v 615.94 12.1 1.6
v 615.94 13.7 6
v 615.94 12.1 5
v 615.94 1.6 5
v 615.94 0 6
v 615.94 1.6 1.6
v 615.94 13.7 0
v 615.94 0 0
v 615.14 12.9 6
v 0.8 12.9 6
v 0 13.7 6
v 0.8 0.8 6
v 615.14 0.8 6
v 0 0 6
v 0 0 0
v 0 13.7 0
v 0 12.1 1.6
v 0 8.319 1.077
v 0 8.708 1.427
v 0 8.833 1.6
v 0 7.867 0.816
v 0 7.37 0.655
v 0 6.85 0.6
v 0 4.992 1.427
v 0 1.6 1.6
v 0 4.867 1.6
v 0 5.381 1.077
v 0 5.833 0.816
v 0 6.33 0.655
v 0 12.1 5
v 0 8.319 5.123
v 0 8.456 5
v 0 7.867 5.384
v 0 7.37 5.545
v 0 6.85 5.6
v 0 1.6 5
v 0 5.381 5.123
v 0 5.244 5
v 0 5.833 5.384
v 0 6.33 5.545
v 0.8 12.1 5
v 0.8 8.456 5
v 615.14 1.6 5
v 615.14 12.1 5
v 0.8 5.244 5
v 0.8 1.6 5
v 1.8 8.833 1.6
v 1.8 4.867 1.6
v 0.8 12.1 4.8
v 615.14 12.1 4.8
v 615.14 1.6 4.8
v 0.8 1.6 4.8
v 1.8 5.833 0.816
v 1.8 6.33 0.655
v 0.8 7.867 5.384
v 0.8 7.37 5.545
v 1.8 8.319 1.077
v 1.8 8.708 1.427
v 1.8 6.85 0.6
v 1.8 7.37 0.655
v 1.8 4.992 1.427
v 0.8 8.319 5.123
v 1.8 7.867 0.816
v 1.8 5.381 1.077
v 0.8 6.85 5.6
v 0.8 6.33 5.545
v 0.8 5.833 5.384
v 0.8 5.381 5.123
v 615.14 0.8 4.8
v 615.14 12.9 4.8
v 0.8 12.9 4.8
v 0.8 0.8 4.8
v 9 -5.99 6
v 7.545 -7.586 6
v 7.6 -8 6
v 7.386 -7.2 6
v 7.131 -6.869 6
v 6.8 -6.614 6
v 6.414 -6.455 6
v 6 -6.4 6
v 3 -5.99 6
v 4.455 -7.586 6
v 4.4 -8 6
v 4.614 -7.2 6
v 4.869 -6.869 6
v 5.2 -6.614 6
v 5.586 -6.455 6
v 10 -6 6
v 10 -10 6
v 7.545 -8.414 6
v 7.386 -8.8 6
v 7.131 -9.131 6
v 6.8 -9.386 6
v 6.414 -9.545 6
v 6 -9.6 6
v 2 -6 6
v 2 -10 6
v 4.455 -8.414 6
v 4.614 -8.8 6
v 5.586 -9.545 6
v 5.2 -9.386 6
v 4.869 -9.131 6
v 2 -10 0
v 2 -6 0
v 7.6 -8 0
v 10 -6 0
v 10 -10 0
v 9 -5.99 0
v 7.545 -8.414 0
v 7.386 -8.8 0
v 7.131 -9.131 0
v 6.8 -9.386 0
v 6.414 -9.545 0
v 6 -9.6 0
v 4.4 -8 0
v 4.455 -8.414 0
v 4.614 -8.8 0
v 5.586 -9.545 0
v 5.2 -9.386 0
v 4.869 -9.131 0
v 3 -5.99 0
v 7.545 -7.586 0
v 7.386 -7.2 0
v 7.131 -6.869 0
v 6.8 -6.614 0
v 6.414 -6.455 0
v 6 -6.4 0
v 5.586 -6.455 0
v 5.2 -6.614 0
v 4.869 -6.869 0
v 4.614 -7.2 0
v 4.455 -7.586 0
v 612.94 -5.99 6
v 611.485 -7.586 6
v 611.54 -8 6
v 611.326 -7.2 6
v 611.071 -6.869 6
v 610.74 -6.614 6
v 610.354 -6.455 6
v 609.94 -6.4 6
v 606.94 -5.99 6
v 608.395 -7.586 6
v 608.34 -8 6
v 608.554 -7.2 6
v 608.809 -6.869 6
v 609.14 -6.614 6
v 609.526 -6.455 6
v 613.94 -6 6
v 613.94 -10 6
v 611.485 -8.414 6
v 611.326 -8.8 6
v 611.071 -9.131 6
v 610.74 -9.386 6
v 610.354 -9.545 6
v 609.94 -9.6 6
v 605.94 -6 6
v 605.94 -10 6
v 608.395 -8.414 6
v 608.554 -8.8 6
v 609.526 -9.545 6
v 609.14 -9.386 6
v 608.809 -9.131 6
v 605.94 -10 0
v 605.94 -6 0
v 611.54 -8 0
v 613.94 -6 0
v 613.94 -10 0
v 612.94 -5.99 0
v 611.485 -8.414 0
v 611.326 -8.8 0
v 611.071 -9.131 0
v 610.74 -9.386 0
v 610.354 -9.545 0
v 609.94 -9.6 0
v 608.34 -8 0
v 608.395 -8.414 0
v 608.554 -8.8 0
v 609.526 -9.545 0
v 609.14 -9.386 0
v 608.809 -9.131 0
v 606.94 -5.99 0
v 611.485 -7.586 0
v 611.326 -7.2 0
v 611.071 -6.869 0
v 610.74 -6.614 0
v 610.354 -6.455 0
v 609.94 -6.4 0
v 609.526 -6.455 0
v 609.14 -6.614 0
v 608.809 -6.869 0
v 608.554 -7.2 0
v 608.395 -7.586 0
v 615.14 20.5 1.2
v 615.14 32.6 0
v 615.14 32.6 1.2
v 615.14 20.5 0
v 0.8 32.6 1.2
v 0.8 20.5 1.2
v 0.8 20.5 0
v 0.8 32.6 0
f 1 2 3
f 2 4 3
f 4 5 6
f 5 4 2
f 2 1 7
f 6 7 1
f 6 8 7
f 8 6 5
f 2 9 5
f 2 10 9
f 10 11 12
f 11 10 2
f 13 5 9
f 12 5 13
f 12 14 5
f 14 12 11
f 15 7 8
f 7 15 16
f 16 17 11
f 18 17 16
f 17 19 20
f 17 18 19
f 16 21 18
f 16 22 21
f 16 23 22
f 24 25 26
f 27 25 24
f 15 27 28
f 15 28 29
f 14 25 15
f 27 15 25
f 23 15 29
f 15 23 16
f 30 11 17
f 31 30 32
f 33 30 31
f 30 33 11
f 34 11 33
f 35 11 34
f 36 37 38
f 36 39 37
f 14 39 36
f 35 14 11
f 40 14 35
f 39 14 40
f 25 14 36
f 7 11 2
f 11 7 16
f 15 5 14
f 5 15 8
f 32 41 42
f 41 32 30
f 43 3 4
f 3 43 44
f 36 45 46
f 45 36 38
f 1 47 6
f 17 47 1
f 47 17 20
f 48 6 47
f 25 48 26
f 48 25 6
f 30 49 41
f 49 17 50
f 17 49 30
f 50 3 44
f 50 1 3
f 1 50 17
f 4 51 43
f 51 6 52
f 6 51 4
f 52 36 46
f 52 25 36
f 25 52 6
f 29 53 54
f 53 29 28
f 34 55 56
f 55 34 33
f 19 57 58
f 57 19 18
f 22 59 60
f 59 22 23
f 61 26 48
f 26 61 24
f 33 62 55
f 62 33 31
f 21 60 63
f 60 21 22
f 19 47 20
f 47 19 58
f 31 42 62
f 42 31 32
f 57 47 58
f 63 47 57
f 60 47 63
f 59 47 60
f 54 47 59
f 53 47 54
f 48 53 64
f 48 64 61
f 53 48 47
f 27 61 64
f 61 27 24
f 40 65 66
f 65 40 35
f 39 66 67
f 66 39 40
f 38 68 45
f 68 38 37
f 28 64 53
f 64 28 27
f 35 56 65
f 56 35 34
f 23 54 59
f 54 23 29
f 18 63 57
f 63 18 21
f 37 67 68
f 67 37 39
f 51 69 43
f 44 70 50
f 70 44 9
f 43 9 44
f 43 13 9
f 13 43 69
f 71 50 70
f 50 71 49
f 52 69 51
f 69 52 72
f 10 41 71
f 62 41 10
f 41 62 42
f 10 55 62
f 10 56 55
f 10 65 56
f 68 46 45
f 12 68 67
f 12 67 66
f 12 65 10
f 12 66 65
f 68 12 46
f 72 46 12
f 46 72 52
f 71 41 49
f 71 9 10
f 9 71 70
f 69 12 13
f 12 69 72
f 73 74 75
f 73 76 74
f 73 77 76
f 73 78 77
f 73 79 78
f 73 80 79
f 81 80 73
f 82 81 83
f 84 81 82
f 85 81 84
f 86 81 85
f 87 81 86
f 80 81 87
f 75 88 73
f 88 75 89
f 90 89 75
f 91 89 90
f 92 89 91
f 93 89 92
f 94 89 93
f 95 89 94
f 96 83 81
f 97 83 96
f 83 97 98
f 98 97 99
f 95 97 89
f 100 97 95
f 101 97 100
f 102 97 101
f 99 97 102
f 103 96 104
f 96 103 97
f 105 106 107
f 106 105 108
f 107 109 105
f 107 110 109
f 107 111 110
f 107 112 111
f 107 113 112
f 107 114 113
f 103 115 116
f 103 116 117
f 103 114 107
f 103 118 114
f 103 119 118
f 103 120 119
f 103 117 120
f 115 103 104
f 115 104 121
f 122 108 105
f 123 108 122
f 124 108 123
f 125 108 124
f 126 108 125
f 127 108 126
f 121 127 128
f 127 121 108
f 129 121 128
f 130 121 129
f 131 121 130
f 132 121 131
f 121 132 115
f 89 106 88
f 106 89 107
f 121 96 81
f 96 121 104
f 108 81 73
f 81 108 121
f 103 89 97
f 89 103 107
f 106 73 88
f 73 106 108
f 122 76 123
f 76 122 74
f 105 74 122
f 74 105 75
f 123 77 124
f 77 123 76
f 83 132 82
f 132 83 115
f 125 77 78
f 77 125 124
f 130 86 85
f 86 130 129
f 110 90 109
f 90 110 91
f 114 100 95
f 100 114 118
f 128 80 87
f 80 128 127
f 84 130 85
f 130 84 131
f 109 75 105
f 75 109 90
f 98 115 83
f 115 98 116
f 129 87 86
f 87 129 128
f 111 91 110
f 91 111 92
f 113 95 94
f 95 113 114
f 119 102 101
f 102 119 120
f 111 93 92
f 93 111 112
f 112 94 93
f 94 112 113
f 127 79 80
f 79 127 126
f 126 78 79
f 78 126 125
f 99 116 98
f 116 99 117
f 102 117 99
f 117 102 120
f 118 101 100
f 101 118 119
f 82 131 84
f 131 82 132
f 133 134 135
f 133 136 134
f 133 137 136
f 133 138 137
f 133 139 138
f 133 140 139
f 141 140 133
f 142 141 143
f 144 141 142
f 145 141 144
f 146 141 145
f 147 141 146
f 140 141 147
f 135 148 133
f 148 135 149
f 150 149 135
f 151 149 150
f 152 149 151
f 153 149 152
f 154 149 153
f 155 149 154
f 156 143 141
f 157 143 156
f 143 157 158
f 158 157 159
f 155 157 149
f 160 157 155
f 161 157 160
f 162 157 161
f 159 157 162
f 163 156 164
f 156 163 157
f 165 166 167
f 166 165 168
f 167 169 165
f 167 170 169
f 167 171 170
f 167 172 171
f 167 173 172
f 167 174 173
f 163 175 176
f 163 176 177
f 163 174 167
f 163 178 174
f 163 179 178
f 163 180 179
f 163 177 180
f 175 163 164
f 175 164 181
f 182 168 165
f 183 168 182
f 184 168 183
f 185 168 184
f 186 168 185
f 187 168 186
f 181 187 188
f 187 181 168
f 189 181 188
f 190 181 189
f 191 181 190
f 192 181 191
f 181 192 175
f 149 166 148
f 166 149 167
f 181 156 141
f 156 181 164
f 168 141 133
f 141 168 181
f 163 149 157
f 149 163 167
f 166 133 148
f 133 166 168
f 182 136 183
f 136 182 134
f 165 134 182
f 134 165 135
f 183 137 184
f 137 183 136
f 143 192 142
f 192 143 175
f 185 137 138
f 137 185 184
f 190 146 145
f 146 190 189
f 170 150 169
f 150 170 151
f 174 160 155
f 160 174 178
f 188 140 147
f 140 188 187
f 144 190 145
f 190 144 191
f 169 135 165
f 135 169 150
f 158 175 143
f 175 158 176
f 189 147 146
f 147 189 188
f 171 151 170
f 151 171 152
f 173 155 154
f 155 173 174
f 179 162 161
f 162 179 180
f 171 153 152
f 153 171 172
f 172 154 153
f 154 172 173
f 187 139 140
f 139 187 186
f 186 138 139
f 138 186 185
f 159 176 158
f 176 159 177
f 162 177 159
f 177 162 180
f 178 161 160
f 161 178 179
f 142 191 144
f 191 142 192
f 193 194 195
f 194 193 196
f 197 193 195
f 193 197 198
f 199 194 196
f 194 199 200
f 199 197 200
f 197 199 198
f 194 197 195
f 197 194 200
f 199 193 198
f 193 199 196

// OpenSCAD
// ============================================================
//  Lumina LED Strip Enclosure — 19 × WS2812B
//
//  Parametric OpenSCAD. Edit PITCH to match your strip's LED
//  spacing (WS2812B 30 LEDs/m = 33.33mm, 60 LEDs/m = 16.66mm,
//  144 LEDs/m = 6.94mm). Default is 30/m — good to match
//  the white-key span on most 49-key controllers.
//
//  Prints in two pieces: base channel (opaque) + diffuser lid.
//  Use white PLA or PETG for the diffuser at 25–30% infill, 2
//  perimeters, for nice even light.
//
//  Rendering: Preview (F5). Export Base and Lid separately by
//  commenting out the other with // at the bottom.
// ============================================================

PITCH        = 33.33;   // center-to-center LED spacing, mm
LED_COUNT    = 19;
STRIP_W      = 10.5;    // WS2812B 30/m strip width
STRIP_H      = 3.0;     // including backing
WALL         = 1.6;
LID_T        = 1.2;     // diffuser lid thickness (thin = brighter)
BASE_H       = 6;
END_PAD      = 8;       // extra length beyond first/last LED
CABLE_D      = 5;       // exit hole diameter

TOTAL_L = PITCH * (LED_COUNT - 1) + 2 * END_PAD;
TOTAL_W = STRIP_W + 2 * WALL;

module base() {
  difference() {
    cube([TOTAL_L, TOTAL_W, BASE_H]);
    // Strip channel
    translate([END_PAD - PITCH/2, WALL, WALL])
      cube([TOTAL_L - 2*(END_PAD - PITCH/2), STRIP_W, STRIP_H + 0.4]);
    // Cable exit
    translate([0, TOTAL_W/2, BASE_H - CABLE_D/2 - 0.4])
      rotate([0,90,0]) cylinder(d=CABLE_D, h=WALL+0.2, $fn=30);
    // Lid lip rebate (inner shoulder)
    translate([WALL/2, WALL/2, BASE_H - LID_T])
      cube([TOTAL_L - WALL, TOTAL_W - WALL, LID_T + 0.01]);
  }
  // Mounting tabs with screw holes
  for (x = [6, TOTAL_L - 6]) {
    translate([x, -6, 0]) difference() {
      hull() {
        translate([-3, 0, 0]) cube([6, 0.01, BASE_H]);
        translate([-4, -4, 0]) cube([8, 4, BASE_H]);
      }
      translate([0, -2, -0.01]) cylinder(d=3.2, h=BASE_H+0.02, $fn=24);
    }
  }
}

module lid() {
  difference() {
    // Main slab
    translate([WALL/2, WALL/2, 0]) cube([TOTAL_L - WALL, TOTAL_W - WALL, LID_T]);
    // 19 pinholes over each LED for a sharper key-by-key look
    // (comment these out for a smooth continuous glow)
    /*
    for (i = [0 : LED_COUNT - 1]) {
      translate([END_PAD + i * PITCH, TOTAL_W/2, -0.01])
        cylinder(d=6, h=LID_T + 0.02, $fn=40);
    }
    */
  }
}

// ---- Output ----
base();
translate([0, TOTAL_W + 6, 0]) lid();
